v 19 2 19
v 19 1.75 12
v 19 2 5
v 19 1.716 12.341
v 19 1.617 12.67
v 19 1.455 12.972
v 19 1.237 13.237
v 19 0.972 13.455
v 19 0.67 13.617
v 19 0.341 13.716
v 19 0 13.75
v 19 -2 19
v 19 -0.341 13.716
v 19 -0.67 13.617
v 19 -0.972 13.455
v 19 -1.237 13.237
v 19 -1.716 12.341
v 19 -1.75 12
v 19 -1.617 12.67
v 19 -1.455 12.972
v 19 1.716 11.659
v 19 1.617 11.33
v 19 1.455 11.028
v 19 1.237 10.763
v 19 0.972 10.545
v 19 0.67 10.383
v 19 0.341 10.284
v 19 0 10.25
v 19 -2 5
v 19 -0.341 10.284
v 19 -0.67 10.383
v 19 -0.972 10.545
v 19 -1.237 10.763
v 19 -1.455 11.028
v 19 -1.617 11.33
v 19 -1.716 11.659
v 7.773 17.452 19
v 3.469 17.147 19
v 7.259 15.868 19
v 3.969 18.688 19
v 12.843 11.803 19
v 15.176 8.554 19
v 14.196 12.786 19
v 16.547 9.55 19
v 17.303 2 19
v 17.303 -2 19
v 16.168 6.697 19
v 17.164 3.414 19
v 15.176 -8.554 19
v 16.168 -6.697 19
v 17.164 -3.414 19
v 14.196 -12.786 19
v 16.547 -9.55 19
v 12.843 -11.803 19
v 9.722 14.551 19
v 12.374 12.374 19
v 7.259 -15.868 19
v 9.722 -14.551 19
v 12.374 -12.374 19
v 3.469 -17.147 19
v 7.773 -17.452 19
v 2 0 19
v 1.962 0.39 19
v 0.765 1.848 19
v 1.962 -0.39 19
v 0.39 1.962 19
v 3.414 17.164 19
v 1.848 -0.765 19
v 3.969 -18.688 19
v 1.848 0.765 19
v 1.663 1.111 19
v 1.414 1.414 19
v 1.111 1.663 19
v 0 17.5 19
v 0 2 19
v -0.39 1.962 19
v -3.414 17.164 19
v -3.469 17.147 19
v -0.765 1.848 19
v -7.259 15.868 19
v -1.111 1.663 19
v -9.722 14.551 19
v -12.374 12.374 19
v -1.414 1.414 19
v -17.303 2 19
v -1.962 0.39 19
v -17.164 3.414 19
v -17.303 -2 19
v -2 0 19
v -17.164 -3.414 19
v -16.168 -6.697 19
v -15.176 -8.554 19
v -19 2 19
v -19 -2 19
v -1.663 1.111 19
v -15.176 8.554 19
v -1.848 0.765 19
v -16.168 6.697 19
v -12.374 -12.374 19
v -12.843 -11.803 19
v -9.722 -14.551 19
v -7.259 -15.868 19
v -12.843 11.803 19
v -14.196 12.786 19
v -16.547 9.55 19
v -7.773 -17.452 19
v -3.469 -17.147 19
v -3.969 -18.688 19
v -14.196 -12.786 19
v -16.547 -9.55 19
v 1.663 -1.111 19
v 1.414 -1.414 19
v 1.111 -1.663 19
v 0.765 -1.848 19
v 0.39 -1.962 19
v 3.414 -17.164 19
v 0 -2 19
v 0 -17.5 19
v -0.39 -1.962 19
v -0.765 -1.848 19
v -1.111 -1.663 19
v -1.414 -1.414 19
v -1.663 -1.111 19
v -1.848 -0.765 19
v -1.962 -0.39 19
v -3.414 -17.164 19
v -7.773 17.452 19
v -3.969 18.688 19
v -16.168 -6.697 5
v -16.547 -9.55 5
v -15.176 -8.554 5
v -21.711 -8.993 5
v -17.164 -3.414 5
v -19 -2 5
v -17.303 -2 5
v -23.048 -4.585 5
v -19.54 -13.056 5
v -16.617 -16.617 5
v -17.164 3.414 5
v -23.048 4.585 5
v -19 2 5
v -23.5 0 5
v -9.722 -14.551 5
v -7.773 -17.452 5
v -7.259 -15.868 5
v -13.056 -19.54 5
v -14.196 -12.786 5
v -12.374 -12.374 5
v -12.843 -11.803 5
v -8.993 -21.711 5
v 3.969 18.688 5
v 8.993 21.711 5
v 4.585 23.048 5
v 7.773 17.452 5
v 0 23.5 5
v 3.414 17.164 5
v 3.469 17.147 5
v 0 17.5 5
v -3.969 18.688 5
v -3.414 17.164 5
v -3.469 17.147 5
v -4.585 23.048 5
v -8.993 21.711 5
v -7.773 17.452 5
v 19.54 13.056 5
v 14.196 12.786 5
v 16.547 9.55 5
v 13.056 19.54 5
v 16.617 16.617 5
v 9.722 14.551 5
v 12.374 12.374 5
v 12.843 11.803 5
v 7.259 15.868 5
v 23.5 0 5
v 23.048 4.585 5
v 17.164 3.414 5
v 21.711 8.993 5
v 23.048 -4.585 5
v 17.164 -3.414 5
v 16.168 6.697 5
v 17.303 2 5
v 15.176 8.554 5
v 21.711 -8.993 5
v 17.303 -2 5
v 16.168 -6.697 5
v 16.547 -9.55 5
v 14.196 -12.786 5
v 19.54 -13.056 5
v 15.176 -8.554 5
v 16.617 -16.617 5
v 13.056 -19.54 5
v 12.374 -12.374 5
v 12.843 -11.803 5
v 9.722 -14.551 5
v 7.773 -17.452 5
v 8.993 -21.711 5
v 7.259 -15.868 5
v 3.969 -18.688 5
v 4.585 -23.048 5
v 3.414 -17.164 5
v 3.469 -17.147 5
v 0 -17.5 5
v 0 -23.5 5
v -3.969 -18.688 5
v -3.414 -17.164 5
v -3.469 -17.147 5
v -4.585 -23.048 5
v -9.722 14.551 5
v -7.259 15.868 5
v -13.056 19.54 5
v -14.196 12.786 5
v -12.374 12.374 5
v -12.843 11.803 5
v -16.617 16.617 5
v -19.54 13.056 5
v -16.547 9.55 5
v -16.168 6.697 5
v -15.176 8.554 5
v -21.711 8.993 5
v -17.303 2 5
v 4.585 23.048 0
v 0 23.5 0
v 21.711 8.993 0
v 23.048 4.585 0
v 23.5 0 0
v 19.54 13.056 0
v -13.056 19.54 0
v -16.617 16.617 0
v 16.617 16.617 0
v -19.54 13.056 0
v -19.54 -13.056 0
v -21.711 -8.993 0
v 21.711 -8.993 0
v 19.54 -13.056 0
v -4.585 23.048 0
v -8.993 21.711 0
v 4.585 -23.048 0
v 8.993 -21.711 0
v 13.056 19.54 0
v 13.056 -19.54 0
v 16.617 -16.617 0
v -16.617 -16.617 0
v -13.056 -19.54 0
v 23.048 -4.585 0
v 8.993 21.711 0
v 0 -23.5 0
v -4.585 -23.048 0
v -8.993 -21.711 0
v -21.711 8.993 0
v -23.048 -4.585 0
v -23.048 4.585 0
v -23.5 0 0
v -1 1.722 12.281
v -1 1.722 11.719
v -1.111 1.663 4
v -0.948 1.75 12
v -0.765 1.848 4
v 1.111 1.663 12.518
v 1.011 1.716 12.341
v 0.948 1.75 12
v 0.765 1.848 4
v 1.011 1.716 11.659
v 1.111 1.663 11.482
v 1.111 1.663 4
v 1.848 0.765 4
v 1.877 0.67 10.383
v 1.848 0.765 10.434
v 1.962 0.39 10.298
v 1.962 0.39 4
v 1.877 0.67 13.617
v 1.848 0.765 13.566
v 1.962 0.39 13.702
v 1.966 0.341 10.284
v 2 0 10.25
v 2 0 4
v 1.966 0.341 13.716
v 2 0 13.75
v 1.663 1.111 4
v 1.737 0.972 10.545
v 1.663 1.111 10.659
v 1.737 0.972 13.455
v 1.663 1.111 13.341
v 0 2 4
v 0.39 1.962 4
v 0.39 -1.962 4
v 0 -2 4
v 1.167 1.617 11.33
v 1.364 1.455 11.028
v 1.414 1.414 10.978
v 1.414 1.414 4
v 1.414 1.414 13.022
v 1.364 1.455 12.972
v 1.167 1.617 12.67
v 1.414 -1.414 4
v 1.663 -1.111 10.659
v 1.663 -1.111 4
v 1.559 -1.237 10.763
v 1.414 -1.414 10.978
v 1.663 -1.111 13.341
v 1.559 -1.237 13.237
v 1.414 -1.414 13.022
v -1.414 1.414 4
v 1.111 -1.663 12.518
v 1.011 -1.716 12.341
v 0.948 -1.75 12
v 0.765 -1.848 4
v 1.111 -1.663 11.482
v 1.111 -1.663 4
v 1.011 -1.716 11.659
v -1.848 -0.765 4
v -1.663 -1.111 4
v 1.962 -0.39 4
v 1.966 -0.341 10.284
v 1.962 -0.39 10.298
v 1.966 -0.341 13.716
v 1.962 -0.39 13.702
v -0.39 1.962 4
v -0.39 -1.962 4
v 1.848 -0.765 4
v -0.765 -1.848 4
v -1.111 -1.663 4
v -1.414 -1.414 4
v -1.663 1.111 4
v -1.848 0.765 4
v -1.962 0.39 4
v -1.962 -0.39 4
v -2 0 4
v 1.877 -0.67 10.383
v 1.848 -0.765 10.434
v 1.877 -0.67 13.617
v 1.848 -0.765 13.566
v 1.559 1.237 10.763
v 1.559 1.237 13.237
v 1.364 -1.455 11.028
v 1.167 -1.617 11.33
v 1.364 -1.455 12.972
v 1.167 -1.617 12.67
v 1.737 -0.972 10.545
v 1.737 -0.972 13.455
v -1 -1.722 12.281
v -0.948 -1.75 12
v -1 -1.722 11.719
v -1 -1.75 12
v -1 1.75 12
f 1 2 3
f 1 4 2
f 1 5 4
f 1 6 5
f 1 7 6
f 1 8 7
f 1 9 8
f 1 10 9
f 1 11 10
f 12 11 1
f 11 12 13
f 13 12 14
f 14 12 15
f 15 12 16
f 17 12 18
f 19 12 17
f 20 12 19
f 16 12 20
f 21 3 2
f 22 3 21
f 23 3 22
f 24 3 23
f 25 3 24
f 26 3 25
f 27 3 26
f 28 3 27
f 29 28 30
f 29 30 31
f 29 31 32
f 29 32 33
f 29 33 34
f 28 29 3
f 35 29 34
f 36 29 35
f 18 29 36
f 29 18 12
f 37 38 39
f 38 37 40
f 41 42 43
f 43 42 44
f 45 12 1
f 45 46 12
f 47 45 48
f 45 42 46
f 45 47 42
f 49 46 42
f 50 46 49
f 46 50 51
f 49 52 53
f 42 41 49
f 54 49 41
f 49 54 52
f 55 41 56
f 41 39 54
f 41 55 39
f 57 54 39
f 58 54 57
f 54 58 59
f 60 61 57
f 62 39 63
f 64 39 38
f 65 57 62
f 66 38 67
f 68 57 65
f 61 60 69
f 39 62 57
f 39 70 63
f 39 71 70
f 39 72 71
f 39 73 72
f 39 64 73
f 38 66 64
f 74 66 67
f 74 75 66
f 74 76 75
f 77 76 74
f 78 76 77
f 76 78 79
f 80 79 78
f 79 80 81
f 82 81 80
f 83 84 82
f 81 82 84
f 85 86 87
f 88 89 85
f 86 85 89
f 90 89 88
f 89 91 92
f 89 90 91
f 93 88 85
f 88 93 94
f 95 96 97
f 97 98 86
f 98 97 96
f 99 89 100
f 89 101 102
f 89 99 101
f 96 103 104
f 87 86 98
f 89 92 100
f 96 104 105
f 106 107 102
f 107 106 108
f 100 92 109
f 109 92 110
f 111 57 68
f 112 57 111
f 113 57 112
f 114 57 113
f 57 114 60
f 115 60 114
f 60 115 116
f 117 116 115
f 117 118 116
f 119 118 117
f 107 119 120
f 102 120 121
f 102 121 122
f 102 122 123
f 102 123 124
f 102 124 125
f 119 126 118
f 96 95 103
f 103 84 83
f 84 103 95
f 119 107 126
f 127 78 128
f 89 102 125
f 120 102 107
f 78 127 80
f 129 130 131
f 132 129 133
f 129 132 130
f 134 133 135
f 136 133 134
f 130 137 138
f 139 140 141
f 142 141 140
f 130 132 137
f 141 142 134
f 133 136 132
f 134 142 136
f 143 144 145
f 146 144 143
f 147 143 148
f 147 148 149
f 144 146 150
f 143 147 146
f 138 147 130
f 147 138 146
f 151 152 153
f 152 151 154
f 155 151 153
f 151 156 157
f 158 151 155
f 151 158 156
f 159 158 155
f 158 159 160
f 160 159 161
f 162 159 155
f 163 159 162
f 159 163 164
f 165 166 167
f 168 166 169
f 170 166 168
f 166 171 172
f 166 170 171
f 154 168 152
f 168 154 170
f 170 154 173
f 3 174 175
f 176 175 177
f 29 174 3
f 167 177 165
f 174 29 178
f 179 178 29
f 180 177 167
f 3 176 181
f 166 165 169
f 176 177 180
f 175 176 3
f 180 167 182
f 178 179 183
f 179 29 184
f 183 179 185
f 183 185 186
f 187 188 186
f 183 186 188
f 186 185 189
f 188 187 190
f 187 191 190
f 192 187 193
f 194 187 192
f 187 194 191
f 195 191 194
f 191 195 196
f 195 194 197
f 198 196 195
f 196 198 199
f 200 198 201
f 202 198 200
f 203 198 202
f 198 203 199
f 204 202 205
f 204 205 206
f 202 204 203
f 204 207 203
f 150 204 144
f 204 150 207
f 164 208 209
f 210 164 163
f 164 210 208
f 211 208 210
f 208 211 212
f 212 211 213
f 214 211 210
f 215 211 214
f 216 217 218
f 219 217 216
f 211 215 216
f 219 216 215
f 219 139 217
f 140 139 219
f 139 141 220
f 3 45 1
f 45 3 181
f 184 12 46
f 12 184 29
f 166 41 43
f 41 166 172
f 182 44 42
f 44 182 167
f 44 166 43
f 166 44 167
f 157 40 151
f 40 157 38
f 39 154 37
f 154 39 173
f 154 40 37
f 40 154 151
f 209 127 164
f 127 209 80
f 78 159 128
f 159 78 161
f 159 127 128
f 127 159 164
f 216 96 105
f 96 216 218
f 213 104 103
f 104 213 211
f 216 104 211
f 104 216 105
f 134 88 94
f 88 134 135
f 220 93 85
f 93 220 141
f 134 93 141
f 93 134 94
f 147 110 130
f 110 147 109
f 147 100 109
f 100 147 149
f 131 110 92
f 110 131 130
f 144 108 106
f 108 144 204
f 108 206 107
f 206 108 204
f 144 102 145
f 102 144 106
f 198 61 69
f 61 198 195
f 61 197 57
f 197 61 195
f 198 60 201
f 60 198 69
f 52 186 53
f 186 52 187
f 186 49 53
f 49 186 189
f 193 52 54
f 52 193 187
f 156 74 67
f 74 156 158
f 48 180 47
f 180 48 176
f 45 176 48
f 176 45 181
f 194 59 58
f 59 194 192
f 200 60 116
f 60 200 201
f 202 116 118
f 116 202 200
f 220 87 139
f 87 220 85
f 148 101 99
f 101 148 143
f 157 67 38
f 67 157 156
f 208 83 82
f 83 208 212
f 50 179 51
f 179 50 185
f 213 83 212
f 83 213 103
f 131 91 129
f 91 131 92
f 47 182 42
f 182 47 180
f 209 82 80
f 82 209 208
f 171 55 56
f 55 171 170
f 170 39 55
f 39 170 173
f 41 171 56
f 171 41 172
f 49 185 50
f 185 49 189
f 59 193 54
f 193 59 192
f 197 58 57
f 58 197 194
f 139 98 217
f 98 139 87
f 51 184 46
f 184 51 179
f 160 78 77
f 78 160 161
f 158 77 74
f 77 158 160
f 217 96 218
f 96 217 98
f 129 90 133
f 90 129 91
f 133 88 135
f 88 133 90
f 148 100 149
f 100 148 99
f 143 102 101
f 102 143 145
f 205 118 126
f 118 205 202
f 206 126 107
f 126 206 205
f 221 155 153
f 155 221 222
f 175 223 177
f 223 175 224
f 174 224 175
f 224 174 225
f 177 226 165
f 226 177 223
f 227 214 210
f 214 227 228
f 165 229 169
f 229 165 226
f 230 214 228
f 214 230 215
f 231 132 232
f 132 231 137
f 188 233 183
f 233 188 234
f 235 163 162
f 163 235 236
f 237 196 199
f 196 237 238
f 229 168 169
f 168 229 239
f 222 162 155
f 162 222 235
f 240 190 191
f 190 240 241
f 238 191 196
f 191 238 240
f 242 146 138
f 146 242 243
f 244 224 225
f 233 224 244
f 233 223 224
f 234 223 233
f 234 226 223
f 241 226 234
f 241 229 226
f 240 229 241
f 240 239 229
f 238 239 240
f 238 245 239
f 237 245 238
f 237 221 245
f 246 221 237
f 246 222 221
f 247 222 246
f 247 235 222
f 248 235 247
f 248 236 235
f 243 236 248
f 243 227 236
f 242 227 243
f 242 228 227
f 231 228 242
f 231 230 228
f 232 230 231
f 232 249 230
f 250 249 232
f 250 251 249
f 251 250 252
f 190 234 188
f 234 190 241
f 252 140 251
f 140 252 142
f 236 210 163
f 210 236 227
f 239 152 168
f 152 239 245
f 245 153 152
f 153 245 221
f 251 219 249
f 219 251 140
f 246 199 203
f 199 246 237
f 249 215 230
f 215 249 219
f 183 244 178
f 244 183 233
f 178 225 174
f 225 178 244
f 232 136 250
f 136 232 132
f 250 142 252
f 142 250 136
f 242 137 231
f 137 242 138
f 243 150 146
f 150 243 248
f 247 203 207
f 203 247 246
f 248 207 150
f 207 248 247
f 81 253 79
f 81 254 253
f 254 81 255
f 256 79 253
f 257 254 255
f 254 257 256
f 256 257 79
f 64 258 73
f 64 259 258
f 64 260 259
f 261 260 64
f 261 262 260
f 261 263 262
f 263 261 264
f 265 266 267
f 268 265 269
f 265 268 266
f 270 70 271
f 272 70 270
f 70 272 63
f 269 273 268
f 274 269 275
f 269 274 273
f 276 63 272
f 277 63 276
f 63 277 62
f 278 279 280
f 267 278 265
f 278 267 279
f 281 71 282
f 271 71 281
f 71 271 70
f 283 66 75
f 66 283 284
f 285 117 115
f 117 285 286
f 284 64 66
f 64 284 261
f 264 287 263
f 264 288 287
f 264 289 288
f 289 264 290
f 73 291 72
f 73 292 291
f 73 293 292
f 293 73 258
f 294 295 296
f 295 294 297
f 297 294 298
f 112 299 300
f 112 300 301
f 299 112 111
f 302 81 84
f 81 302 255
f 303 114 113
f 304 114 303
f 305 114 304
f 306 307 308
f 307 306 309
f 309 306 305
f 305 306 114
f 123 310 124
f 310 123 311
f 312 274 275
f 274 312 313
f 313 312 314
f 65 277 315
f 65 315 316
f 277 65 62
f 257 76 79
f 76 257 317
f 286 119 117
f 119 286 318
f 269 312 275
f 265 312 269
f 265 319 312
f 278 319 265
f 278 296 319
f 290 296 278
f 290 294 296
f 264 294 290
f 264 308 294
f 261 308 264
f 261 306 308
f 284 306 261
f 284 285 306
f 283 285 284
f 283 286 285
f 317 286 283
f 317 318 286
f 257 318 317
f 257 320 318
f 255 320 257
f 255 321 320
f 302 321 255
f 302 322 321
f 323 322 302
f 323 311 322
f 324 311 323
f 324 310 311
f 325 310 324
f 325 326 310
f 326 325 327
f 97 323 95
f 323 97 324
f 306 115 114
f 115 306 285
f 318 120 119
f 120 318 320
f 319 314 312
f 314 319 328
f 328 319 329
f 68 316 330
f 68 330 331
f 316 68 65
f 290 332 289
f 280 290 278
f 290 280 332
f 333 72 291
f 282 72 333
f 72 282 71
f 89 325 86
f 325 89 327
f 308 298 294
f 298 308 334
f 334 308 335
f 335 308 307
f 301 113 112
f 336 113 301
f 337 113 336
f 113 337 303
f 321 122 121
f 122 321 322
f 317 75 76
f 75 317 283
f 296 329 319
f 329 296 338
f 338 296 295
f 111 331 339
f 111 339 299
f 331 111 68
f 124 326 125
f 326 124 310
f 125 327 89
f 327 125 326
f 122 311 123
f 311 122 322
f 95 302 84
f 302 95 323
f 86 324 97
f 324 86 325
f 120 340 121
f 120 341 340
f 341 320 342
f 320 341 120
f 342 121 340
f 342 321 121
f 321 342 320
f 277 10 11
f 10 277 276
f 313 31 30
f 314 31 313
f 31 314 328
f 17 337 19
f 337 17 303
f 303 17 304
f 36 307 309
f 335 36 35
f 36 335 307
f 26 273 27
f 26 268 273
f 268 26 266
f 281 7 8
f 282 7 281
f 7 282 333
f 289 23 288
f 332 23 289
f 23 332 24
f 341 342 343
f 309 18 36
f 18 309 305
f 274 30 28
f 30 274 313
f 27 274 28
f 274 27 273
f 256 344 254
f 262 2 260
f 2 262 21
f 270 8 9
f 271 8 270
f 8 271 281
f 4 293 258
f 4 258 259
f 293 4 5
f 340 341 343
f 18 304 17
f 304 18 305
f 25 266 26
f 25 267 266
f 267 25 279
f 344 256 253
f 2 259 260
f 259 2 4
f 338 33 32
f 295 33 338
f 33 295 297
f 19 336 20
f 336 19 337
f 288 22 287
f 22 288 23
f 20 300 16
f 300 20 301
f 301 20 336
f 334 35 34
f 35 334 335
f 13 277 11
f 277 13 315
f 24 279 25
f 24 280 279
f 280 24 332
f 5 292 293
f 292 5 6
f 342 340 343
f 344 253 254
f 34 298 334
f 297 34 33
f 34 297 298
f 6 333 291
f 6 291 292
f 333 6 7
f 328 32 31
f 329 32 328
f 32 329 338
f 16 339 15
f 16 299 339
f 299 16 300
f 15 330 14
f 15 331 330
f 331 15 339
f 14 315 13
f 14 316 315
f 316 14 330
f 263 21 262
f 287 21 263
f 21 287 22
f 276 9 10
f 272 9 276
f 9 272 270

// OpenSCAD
$fn = 32;

// ----------------------------------------------------------------------
// Control knob: skirt knob with grip ribs
// ----------------------------------------------------------------------

// --- parameters (mm) ---
skirt_d = 47;             // skirt diameter
skirt_t = 5;              // skirt thickness
rib_w = 4;                // grip rib width
rib_out = 2.5;            // grip rib radial protrusion
n_ribs = 10;              // number of grip ribs
knob_d = 35;              // knob body diameter
knob_h = 14;              // knob body height
bore_d = 4;               // shaft bore diameter
set_d = 3.5;              // set screw bore diameter
fit_tol = 0.05;           // tolerance for press fits, mm
free_tol = 0.3;           // tolerance for clearance fits, mm

rib_step = 360 / n_ribs;  // rib angular step
total_h = skirt_t + knob_h;  // overall height

difference() {
  union() {
    translate([0, 0, skirt_t]) cylinder(h = knob_h, d = knob_d);
    cylinder(h = skirt_t, d = skirt_d);
    for (i = [0 : n_ribs - 1])
      rotate([0, 0, i * rib_step])
        translate([knob_d / 2 - 1, -rib_w / 2, skirt_t])
          cube([rib_out, rib_w, knob_h]);
  }
  translate([0, 0, skirt_t - 1]) cylinder(h = knob_h + 2, d = bore_d);
  translate([-1, 0, skirt_t + knob_h / 2]) rotate([0, 90, 0])
    cylinder(h = knob_d / 2 + bore_d / 2 + 2, d = set_d);
}
